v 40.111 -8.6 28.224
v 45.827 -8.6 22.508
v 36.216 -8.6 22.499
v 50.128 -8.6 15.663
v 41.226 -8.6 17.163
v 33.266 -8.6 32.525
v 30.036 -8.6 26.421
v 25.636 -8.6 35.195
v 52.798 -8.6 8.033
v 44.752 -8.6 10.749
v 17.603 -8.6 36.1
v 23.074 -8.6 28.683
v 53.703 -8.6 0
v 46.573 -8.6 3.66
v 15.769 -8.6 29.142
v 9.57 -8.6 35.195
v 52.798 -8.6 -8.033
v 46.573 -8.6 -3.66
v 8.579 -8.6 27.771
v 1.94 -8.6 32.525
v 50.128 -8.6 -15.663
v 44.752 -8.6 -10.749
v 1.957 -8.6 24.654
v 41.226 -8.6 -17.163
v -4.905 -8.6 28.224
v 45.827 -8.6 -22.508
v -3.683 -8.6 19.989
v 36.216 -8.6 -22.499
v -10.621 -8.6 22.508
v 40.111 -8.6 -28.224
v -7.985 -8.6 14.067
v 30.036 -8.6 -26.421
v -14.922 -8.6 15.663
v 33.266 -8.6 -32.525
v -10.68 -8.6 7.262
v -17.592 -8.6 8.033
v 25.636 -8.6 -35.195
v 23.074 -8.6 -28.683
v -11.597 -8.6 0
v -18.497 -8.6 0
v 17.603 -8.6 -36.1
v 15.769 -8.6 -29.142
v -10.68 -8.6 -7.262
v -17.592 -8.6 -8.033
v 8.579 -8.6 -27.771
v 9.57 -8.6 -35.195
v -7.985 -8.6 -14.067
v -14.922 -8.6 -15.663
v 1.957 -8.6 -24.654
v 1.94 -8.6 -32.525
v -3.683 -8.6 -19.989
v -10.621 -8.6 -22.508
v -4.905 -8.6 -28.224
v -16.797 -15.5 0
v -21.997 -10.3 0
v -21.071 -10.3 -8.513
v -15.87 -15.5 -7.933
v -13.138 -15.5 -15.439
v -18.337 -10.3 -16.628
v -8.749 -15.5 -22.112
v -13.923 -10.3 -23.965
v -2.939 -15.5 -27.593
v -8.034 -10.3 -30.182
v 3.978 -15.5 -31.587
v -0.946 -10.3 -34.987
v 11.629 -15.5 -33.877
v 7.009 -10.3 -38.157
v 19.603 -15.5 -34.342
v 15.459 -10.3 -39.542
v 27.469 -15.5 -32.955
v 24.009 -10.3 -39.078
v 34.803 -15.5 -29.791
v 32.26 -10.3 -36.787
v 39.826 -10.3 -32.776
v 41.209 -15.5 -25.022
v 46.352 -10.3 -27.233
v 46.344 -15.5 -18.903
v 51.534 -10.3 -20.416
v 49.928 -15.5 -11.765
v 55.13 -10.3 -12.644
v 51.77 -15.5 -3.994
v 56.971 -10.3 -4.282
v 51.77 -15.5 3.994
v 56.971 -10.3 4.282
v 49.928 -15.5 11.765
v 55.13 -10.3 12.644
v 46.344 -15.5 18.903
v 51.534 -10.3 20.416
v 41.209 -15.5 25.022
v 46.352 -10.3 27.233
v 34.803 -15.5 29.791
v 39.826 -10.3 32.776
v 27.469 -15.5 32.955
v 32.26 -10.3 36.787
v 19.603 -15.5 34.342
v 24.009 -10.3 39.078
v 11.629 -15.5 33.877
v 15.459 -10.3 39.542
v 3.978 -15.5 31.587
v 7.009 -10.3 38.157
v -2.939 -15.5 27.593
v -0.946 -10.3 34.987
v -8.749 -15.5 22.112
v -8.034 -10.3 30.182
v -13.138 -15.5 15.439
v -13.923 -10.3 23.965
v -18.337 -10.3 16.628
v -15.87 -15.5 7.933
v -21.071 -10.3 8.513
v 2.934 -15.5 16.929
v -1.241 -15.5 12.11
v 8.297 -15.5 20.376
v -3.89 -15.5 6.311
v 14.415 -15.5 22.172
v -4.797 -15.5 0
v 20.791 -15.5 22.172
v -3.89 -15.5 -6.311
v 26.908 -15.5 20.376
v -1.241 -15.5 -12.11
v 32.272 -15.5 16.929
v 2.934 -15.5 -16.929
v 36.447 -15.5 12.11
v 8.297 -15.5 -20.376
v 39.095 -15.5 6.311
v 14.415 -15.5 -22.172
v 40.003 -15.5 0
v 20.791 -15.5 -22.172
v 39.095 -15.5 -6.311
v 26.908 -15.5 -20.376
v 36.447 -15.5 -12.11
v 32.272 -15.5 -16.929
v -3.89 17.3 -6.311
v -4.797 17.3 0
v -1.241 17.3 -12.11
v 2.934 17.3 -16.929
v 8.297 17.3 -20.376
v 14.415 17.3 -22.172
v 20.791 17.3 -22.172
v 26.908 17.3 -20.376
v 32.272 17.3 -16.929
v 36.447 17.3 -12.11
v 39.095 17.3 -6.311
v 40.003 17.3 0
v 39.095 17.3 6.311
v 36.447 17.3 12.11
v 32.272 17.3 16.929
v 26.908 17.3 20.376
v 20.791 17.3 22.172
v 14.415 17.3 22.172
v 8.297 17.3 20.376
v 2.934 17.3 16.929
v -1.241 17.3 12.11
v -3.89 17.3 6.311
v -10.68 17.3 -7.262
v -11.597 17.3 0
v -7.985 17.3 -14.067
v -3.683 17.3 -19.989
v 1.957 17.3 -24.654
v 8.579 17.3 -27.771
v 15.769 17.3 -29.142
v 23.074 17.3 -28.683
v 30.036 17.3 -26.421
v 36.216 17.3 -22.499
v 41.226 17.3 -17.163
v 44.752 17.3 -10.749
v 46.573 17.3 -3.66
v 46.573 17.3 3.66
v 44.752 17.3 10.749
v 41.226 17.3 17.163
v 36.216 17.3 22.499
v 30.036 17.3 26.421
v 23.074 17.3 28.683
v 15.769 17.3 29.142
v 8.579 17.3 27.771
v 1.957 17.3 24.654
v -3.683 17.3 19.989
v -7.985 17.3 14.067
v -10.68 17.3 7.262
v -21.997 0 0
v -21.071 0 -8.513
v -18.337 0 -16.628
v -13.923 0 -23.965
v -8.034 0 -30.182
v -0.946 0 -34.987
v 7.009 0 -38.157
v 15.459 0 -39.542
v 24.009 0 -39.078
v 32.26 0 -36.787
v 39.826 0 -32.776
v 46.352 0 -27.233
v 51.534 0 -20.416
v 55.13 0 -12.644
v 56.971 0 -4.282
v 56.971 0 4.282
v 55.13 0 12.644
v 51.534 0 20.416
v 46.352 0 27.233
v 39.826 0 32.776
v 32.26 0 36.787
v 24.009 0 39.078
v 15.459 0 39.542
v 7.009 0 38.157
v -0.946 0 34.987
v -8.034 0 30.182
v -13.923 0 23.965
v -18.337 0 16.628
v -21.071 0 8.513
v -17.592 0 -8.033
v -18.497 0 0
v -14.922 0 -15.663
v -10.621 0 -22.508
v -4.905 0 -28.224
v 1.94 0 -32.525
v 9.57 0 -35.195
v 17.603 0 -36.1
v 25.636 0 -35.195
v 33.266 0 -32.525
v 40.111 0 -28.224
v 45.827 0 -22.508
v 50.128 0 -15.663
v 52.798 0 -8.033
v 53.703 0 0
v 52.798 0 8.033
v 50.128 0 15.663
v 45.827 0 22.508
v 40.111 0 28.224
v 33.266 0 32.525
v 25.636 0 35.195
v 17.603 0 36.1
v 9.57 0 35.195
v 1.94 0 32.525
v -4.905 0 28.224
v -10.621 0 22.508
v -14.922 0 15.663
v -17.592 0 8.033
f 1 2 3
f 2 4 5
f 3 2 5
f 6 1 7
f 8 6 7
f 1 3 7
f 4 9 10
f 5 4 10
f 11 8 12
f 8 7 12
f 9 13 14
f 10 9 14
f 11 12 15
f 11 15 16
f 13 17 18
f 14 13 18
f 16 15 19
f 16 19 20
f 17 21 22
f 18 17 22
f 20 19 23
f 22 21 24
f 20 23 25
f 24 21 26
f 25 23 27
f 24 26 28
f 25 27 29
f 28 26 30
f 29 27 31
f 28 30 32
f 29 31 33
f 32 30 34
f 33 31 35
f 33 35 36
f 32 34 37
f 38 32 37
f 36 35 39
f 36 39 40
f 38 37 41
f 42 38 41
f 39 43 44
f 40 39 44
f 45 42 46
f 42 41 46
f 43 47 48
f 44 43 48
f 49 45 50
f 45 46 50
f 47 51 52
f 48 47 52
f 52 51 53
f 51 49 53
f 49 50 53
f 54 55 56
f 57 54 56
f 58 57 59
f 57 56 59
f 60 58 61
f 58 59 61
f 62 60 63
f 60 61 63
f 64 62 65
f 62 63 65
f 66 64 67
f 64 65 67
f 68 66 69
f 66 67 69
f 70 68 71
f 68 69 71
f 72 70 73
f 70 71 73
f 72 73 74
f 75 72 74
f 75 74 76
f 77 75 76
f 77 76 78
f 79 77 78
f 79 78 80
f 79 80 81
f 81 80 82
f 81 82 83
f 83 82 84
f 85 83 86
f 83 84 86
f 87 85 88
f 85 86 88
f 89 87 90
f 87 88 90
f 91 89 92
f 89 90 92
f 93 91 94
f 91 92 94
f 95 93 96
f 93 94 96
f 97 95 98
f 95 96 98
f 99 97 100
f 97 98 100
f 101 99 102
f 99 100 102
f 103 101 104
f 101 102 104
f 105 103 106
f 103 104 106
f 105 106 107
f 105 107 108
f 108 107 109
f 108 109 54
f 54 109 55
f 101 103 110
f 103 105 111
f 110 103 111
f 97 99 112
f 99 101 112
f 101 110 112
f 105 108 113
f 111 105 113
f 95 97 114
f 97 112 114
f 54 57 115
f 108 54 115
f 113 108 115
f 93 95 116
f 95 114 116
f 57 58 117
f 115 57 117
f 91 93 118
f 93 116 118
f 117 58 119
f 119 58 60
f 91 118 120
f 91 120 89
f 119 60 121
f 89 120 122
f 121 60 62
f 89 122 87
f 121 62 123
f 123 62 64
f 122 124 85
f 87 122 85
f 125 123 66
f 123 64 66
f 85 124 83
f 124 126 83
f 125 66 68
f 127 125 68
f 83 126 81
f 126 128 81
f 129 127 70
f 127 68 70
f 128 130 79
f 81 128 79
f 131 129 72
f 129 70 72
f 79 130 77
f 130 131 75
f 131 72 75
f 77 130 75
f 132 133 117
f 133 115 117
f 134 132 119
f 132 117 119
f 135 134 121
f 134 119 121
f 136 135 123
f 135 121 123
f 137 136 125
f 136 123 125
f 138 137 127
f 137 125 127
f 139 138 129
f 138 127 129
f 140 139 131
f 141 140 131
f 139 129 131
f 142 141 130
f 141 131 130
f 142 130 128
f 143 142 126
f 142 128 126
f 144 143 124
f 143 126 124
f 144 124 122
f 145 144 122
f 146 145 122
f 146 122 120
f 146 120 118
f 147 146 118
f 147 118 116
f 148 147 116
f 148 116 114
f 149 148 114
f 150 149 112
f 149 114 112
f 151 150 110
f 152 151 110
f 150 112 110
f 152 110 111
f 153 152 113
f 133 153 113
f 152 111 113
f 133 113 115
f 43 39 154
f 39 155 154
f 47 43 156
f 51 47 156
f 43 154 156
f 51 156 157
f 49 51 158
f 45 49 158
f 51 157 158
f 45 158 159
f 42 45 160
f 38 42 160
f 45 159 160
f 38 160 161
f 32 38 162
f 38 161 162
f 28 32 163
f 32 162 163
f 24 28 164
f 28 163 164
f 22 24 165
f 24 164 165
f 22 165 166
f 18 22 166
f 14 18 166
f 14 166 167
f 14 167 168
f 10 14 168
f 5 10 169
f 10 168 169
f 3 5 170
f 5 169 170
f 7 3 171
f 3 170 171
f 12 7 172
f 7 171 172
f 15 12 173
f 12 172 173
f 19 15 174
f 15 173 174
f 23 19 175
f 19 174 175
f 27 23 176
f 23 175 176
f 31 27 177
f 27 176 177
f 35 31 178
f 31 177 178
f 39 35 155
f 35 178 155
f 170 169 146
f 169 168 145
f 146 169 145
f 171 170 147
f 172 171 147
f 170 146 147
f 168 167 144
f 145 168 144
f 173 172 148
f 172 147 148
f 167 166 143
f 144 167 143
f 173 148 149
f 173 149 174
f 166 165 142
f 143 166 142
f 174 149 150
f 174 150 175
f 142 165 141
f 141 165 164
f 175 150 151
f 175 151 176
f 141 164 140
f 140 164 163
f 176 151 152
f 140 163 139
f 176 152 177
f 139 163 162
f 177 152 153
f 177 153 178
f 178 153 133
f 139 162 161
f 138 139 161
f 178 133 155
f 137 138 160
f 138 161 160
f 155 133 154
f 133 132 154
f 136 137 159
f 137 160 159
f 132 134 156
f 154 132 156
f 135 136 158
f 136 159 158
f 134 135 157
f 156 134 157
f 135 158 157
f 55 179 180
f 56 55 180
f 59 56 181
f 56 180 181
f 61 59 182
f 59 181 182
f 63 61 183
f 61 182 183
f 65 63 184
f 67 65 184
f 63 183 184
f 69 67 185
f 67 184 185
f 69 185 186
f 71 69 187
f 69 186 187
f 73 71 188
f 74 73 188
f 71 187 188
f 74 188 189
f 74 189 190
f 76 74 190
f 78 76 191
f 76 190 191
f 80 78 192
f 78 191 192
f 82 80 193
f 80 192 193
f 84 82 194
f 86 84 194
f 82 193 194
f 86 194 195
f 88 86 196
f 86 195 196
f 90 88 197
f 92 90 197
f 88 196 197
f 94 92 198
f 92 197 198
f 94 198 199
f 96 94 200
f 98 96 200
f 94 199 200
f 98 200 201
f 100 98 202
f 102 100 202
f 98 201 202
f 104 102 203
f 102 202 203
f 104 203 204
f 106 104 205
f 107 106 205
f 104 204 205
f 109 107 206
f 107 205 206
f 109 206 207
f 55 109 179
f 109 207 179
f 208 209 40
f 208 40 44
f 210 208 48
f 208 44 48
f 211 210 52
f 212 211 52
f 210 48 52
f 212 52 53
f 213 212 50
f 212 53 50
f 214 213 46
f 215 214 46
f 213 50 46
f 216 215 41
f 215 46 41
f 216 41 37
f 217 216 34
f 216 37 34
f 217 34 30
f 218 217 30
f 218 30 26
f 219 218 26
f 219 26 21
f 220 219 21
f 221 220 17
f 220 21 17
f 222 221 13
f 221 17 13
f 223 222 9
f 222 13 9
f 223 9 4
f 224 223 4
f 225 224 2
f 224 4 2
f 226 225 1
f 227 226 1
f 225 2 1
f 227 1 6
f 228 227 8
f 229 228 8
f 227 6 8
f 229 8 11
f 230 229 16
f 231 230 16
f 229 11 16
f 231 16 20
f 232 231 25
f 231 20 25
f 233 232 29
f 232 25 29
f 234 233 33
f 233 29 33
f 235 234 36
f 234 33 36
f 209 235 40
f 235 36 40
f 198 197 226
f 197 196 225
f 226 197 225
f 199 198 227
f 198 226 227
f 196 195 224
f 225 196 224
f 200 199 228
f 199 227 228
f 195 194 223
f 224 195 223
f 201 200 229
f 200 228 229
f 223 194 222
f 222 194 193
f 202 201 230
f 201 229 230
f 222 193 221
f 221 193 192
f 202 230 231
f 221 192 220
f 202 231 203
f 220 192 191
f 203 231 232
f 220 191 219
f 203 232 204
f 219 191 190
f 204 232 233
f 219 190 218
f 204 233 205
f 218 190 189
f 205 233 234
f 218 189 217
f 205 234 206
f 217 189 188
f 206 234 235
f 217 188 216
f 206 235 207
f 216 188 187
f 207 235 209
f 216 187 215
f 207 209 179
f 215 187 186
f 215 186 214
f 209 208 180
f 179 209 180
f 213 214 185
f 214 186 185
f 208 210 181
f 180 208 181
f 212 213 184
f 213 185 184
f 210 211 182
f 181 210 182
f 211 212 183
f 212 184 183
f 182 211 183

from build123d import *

# Parameters (mm, degrees)
CHAMFER1_SIZE = 5.2


with BuildPart() as part:
    # Sketch1 → Revolve1 (revolve)
    with BuildSketch(Plane.XY):
        Polygon((-11.59722846, 17.3), (-4.79722846, 17.3), (-4.79722846, -15.5), (-21.99722846, -15.5), (-21.99722846, 0), (-18.49722846, 0), (-18.49722846, -8.6), (-11.59722846, -8.6), align=None)
    revolve(axis=Axis((17.60277154, 25.472027778, 0), (0, -1, 0)))

    # Chamfer1
    chamfer1_edges = [part.edges().sort_by_distance(p)[0] for p in [
        (57.20277154, -15.5, 0),
    ]]
    chamfer(chamfer1_edges, length=CHAMFER1_SIZE)


solid = part.part
